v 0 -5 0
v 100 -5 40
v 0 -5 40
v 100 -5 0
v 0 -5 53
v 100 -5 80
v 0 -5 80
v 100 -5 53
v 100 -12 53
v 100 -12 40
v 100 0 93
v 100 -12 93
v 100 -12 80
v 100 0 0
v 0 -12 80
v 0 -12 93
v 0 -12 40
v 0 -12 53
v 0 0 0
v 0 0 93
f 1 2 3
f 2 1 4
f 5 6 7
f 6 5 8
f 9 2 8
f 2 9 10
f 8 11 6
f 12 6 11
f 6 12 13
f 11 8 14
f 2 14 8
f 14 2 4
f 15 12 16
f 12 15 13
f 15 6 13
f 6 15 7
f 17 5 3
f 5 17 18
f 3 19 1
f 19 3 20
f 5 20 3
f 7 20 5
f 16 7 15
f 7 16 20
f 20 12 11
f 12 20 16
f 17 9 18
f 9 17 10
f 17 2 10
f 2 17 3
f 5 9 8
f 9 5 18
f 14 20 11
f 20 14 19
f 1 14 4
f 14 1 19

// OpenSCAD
// file: ../Library/GeneralBracket.scad
HOLE_HEIGHT = 13;
HOLE_THICKNESS = 7;
WOOD_SLAB_HEIGHT = 27;

function BracketHeight(number_of_bracket) = ((HOLE_HEIGHT + WOOD_SLAB_HEIGHT)*(number_of_bracket))+ HOLE_HEIGHT;

module GeneralBracket(number_of_bracket, width, thickness)
{
    height = BracketHeight(number_of_bracket);
    
    linear_extrude(thickness)
    square([width,height]);
    
    for(i = [0:number_of_bracket-1])
        translate([0,(HOLE_HEIGHT + WOOD_SLAB_HEIGHT)*i, thickness])
        linear_extrude(HOLE_THICKNESS)
        square([width, HOLE_HEIGHT]);
}
// main file
include <../Library/GeneralBracket.scad>

BRACKET_WIDTH = 100;
NUMBER_OF_BRACKET = 2;
THICKNESS = 5;

translate([BRACKET_WIDTH, 0, BracketHeight(NUMBER_OF_BRACKET)])
rotate([90,180,0])
GeneralBracket(NUMBER_OF_BRACKET, BRACKET_WIDTH, THICKNESS);
